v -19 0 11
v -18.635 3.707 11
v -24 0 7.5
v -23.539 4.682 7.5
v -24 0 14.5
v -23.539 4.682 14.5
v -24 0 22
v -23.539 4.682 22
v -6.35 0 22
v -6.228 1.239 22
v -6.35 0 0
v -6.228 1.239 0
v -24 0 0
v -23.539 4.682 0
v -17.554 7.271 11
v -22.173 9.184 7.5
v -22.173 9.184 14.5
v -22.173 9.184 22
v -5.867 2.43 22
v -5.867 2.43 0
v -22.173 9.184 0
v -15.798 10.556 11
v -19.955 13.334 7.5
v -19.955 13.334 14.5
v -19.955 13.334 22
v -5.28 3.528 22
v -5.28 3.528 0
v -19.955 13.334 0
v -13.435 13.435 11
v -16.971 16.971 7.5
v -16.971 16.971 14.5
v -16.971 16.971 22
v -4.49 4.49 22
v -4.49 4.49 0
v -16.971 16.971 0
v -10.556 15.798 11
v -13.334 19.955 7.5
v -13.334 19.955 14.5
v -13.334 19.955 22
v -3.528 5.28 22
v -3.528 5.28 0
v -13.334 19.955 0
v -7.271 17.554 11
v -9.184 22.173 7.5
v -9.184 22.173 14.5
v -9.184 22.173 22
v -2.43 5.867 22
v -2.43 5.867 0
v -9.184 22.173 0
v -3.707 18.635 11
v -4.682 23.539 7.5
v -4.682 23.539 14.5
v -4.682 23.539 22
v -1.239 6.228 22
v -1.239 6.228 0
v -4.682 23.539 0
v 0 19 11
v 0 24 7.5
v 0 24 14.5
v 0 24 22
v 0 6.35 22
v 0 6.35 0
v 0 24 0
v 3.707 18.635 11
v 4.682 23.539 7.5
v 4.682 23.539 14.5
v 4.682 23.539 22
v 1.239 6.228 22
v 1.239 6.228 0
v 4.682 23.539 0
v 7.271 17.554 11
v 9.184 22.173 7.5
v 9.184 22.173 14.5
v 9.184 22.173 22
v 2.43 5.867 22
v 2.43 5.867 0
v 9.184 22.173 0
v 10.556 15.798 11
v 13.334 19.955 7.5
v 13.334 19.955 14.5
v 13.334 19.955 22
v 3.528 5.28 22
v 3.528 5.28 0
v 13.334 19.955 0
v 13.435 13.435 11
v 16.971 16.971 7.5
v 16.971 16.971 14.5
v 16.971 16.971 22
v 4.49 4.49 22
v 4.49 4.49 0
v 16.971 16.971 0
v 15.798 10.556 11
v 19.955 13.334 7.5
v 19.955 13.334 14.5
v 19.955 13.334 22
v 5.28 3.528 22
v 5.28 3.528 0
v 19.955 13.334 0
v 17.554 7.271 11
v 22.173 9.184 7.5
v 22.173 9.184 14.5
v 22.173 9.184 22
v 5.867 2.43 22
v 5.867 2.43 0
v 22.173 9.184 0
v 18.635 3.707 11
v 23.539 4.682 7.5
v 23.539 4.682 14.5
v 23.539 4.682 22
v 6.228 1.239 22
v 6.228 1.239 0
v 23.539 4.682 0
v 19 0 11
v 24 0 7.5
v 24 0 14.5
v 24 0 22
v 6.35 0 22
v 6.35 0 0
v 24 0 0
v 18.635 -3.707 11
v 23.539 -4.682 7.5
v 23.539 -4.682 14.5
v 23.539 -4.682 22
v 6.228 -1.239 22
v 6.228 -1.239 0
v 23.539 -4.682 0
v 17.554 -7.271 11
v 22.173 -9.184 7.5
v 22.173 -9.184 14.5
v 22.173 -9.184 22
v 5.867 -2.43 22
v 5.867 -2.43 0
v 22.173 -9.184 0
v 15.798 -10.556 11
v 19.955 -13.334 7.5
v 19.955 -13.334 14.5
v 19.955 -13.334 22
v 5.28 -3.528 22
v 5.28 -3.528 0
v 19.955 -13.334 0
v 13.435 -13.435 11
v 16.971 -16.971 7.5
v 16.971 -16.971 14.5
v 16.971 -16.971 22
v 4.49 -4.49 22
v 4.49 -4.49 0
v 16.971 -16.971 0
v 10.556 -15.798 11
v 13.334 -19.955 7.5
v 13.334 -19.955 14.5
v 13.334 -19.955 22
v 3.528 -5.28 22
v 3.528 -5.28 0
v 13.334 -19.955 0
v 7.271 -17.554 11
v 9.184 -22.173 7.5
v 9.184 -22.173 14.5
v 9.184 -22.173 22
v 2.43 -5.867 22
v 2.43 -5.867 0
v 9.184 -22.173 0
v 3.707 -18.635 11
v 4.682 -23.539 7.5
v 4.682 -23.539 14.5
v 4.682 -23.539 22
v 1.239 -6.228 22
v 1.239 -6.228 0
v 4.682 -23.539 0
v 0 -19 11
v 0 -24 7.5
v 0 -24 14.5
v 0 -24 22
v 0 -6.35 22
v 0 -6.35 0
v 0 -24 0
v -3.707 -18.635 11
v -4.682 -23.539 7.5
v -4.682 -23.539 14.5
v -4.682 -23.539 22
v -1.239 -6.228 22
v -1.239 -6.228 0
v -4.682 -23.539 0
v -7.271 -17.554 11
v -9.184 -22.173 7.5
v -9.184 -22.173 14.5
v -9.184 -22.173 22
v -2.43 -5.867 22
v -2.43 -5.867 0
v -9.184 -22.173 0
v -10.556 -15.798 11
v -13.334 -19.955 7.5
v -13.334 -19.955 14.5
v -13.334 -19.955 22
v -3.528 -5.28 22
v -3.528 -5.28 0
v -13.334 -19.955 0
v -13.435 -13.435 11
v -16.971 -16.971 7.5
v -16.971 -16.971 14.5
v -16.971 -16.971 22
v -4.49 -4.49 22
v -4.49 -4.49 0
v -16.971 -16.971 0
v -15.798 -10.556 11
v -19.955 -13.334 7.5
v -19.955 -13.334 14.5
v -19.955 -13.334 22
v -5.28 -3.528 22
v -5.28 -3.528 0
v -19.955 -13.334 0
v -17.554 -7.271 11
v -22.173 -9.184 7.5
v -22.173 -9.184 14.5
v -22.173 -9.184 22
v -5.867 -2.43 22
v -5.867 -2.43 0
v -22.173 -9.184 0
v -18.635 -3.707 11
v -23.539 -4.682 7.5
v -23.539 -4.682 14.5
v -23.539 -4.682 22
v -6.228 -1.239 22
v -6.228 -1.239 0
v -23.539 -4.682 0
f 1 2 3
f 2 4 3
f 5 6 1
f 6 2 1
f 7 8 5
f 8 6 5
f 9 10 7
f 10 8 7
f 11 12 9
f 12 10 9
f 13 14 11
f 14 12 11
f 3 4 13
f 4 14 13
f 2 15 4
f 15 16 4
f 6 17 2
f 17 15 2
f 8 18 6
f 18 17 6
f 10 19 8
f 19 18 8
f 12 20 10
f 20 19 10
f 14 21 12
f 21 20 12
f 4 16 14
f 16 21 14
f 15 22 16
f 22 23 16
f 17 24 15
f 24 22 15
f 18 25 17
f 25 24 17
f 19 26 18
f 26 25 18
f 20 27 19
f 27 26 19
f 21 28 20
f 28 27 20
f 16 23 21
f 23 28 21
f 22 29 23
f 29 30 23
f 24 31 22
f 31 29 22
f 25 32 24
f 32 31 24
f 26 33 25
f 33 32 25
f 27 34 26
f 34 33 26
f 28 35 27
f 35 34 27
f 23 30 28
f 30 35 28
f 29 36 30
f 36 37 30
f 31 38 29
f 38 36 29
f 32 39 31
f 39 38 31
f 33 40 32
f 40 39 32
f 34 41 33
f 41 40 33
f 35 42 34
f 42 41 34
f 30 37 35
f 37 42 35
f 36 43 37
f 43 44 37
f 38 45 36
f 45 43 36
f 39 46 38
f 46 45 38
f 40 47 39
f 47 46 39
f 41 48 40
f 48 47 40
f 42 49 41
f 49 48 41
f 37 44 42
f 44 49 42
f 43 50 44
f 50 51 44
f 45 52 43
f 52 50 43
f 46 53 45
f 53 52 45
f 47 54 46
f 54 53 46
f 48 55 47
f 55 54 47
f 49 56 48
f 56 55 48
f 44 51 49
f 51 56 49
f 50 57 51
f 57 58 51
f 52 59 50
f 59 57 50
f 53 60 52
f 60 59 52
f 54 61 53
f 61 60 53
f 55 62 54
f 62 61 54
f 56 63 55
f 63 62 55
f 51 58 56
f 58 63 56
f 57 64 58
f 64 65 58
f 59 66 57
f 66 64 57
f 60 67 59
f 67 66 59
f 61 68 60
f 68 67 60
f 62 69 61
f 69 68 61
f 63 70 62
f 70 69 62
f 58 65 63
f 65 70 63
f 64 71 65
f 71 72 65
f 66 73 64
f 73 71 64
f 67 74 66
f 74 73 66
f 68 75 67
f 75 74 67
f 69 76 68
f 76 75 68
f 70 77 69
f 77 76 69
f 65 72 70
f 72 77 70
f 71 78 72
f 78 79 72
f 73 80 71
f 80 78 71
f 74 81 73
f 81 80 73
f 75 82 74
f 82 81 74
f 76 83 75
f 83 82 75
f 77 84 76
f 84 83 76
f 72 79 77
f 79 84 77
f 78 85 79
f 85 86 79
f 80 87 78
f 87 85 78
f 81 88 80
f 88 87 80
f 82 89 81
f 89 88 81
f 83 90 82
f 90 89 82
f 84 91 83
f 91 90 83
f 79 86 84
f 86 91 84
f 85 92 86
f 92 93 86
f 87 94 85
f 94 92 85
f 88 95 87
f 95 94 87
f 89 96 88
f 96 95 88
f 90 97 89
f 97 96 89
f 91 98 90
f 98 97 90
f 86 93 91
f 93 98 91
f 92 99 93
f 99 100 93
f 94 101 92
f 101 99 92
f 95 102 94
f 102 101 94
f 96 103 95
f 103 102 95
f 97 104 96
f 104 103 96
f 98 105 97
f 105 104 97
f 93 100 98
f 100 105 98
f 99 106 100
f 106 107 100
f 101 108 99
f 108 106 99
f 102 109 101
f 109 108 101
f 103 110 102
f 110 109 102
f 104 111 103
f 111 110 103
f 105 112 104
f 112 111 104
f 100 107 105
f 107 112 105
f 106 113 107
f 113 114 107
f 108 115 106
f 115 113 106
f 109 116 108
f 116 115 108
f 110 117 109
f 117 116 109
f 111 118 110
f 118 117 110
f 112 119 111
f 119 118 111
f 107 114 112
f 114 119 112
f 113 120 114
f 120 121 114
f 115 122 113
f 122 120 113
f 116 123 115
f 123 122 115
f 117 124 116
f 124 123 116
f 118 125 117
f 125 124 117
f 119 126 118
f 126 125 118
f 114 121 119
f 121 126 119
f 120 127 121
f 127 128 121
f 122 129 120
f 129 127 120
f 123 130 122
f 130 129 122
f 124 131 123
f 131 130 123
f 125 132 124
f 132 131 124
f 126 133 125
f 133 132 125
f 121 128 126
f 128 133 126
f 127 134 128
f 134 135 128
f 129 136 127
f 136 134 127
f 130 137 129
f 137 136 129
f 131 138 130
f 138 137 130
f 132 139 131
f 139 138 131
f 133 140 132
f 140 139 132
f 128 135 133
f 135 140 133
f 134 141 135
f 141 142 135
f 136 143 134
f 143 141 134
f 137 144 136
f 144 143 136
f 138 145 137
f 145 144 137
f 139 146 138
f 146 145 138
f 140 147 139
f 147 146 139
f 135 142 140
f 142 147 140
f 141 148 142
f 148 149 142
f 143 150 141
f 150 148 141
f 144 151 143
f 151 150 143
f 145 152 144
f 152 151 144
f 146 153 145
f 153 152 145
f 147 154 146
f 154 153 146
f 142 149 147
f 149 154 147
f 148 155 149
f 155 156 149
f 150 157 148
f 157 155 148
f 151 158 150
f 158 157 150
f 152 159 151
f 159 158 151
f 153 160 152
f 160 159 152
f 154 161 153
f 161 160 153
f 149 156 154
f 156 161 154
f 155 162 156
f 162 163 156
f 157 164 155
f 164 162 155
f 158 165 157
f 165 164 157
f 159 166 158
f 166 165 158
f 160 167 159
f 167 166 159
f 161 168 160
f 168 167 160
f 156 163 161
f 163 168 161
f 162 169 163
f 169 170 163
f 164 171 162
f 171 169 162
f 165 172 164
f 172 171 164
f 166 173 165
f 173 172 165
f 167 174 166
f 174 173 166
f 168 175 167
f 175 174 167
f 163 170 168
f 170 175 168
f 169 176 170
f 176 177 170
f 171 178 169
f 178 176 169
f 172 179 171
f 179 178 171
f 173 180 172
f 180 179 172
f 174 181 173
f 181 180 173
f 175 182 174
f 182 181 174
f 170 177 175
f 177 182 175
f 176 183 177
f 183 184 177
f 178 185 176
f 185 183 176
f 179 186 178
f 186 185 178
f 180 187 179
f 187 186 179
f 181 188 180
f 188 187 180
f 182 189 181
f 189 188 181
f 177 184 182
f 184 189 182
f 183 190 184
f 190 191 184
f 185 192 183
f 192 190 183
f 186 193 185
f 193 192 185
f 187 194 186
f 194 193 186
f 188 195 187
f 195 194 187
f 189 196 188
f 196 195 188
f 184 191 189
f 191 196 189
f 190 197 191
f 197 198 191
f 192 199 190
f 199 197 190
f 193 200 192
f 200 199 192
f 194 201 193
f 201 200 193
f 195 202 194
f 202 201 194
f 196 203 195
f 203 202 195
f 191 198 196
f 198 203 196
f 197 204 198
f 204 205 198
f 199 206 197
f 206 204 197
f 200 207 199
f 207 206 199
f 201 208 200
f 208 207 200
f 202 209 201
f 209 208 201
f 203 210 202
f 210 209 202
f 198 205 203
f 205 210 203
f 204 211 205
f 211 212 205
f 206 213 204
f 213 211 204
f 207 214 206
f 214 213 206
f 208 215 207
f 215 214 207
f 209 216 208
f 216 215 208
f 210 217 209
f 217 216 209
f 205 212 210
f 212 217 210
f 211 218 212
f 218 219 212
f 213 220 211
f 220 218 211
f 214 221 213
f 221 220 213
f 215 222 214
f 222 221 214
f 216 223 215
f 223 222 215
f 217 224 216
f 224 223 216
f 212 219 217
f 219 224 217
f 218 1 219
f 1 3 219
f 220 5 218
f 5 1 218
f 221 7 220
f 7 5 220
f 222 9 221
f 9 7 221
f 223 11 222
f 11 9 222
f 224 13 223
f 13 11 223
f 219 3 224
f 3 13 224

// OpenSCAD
$fn = 32;

// ----------------------------------------------------------------------
// Belt roller: 48 mm barrel, 22 mm wide, bore 12.7 mm
// ----------------------------------------------------------------------

// --- parameters (mm) ---
bore_d = 12.7;            // bore
barrel_d = 48;            // barrel diameter
roller_w = 22;            // roller width
groove_w = 7;             // guide groove width
groove_d = 5;             // guide groove depth

roller_profile = [[6.35, 0], [24, 0], [24, 7.5], [19, 11], [24, 14.5], [24, 22], [6.35, 22]];

/* the profile stays clear of the axis, so the bore comes out of the revolve */
rotate_extrude() polygon(roller_profile);
